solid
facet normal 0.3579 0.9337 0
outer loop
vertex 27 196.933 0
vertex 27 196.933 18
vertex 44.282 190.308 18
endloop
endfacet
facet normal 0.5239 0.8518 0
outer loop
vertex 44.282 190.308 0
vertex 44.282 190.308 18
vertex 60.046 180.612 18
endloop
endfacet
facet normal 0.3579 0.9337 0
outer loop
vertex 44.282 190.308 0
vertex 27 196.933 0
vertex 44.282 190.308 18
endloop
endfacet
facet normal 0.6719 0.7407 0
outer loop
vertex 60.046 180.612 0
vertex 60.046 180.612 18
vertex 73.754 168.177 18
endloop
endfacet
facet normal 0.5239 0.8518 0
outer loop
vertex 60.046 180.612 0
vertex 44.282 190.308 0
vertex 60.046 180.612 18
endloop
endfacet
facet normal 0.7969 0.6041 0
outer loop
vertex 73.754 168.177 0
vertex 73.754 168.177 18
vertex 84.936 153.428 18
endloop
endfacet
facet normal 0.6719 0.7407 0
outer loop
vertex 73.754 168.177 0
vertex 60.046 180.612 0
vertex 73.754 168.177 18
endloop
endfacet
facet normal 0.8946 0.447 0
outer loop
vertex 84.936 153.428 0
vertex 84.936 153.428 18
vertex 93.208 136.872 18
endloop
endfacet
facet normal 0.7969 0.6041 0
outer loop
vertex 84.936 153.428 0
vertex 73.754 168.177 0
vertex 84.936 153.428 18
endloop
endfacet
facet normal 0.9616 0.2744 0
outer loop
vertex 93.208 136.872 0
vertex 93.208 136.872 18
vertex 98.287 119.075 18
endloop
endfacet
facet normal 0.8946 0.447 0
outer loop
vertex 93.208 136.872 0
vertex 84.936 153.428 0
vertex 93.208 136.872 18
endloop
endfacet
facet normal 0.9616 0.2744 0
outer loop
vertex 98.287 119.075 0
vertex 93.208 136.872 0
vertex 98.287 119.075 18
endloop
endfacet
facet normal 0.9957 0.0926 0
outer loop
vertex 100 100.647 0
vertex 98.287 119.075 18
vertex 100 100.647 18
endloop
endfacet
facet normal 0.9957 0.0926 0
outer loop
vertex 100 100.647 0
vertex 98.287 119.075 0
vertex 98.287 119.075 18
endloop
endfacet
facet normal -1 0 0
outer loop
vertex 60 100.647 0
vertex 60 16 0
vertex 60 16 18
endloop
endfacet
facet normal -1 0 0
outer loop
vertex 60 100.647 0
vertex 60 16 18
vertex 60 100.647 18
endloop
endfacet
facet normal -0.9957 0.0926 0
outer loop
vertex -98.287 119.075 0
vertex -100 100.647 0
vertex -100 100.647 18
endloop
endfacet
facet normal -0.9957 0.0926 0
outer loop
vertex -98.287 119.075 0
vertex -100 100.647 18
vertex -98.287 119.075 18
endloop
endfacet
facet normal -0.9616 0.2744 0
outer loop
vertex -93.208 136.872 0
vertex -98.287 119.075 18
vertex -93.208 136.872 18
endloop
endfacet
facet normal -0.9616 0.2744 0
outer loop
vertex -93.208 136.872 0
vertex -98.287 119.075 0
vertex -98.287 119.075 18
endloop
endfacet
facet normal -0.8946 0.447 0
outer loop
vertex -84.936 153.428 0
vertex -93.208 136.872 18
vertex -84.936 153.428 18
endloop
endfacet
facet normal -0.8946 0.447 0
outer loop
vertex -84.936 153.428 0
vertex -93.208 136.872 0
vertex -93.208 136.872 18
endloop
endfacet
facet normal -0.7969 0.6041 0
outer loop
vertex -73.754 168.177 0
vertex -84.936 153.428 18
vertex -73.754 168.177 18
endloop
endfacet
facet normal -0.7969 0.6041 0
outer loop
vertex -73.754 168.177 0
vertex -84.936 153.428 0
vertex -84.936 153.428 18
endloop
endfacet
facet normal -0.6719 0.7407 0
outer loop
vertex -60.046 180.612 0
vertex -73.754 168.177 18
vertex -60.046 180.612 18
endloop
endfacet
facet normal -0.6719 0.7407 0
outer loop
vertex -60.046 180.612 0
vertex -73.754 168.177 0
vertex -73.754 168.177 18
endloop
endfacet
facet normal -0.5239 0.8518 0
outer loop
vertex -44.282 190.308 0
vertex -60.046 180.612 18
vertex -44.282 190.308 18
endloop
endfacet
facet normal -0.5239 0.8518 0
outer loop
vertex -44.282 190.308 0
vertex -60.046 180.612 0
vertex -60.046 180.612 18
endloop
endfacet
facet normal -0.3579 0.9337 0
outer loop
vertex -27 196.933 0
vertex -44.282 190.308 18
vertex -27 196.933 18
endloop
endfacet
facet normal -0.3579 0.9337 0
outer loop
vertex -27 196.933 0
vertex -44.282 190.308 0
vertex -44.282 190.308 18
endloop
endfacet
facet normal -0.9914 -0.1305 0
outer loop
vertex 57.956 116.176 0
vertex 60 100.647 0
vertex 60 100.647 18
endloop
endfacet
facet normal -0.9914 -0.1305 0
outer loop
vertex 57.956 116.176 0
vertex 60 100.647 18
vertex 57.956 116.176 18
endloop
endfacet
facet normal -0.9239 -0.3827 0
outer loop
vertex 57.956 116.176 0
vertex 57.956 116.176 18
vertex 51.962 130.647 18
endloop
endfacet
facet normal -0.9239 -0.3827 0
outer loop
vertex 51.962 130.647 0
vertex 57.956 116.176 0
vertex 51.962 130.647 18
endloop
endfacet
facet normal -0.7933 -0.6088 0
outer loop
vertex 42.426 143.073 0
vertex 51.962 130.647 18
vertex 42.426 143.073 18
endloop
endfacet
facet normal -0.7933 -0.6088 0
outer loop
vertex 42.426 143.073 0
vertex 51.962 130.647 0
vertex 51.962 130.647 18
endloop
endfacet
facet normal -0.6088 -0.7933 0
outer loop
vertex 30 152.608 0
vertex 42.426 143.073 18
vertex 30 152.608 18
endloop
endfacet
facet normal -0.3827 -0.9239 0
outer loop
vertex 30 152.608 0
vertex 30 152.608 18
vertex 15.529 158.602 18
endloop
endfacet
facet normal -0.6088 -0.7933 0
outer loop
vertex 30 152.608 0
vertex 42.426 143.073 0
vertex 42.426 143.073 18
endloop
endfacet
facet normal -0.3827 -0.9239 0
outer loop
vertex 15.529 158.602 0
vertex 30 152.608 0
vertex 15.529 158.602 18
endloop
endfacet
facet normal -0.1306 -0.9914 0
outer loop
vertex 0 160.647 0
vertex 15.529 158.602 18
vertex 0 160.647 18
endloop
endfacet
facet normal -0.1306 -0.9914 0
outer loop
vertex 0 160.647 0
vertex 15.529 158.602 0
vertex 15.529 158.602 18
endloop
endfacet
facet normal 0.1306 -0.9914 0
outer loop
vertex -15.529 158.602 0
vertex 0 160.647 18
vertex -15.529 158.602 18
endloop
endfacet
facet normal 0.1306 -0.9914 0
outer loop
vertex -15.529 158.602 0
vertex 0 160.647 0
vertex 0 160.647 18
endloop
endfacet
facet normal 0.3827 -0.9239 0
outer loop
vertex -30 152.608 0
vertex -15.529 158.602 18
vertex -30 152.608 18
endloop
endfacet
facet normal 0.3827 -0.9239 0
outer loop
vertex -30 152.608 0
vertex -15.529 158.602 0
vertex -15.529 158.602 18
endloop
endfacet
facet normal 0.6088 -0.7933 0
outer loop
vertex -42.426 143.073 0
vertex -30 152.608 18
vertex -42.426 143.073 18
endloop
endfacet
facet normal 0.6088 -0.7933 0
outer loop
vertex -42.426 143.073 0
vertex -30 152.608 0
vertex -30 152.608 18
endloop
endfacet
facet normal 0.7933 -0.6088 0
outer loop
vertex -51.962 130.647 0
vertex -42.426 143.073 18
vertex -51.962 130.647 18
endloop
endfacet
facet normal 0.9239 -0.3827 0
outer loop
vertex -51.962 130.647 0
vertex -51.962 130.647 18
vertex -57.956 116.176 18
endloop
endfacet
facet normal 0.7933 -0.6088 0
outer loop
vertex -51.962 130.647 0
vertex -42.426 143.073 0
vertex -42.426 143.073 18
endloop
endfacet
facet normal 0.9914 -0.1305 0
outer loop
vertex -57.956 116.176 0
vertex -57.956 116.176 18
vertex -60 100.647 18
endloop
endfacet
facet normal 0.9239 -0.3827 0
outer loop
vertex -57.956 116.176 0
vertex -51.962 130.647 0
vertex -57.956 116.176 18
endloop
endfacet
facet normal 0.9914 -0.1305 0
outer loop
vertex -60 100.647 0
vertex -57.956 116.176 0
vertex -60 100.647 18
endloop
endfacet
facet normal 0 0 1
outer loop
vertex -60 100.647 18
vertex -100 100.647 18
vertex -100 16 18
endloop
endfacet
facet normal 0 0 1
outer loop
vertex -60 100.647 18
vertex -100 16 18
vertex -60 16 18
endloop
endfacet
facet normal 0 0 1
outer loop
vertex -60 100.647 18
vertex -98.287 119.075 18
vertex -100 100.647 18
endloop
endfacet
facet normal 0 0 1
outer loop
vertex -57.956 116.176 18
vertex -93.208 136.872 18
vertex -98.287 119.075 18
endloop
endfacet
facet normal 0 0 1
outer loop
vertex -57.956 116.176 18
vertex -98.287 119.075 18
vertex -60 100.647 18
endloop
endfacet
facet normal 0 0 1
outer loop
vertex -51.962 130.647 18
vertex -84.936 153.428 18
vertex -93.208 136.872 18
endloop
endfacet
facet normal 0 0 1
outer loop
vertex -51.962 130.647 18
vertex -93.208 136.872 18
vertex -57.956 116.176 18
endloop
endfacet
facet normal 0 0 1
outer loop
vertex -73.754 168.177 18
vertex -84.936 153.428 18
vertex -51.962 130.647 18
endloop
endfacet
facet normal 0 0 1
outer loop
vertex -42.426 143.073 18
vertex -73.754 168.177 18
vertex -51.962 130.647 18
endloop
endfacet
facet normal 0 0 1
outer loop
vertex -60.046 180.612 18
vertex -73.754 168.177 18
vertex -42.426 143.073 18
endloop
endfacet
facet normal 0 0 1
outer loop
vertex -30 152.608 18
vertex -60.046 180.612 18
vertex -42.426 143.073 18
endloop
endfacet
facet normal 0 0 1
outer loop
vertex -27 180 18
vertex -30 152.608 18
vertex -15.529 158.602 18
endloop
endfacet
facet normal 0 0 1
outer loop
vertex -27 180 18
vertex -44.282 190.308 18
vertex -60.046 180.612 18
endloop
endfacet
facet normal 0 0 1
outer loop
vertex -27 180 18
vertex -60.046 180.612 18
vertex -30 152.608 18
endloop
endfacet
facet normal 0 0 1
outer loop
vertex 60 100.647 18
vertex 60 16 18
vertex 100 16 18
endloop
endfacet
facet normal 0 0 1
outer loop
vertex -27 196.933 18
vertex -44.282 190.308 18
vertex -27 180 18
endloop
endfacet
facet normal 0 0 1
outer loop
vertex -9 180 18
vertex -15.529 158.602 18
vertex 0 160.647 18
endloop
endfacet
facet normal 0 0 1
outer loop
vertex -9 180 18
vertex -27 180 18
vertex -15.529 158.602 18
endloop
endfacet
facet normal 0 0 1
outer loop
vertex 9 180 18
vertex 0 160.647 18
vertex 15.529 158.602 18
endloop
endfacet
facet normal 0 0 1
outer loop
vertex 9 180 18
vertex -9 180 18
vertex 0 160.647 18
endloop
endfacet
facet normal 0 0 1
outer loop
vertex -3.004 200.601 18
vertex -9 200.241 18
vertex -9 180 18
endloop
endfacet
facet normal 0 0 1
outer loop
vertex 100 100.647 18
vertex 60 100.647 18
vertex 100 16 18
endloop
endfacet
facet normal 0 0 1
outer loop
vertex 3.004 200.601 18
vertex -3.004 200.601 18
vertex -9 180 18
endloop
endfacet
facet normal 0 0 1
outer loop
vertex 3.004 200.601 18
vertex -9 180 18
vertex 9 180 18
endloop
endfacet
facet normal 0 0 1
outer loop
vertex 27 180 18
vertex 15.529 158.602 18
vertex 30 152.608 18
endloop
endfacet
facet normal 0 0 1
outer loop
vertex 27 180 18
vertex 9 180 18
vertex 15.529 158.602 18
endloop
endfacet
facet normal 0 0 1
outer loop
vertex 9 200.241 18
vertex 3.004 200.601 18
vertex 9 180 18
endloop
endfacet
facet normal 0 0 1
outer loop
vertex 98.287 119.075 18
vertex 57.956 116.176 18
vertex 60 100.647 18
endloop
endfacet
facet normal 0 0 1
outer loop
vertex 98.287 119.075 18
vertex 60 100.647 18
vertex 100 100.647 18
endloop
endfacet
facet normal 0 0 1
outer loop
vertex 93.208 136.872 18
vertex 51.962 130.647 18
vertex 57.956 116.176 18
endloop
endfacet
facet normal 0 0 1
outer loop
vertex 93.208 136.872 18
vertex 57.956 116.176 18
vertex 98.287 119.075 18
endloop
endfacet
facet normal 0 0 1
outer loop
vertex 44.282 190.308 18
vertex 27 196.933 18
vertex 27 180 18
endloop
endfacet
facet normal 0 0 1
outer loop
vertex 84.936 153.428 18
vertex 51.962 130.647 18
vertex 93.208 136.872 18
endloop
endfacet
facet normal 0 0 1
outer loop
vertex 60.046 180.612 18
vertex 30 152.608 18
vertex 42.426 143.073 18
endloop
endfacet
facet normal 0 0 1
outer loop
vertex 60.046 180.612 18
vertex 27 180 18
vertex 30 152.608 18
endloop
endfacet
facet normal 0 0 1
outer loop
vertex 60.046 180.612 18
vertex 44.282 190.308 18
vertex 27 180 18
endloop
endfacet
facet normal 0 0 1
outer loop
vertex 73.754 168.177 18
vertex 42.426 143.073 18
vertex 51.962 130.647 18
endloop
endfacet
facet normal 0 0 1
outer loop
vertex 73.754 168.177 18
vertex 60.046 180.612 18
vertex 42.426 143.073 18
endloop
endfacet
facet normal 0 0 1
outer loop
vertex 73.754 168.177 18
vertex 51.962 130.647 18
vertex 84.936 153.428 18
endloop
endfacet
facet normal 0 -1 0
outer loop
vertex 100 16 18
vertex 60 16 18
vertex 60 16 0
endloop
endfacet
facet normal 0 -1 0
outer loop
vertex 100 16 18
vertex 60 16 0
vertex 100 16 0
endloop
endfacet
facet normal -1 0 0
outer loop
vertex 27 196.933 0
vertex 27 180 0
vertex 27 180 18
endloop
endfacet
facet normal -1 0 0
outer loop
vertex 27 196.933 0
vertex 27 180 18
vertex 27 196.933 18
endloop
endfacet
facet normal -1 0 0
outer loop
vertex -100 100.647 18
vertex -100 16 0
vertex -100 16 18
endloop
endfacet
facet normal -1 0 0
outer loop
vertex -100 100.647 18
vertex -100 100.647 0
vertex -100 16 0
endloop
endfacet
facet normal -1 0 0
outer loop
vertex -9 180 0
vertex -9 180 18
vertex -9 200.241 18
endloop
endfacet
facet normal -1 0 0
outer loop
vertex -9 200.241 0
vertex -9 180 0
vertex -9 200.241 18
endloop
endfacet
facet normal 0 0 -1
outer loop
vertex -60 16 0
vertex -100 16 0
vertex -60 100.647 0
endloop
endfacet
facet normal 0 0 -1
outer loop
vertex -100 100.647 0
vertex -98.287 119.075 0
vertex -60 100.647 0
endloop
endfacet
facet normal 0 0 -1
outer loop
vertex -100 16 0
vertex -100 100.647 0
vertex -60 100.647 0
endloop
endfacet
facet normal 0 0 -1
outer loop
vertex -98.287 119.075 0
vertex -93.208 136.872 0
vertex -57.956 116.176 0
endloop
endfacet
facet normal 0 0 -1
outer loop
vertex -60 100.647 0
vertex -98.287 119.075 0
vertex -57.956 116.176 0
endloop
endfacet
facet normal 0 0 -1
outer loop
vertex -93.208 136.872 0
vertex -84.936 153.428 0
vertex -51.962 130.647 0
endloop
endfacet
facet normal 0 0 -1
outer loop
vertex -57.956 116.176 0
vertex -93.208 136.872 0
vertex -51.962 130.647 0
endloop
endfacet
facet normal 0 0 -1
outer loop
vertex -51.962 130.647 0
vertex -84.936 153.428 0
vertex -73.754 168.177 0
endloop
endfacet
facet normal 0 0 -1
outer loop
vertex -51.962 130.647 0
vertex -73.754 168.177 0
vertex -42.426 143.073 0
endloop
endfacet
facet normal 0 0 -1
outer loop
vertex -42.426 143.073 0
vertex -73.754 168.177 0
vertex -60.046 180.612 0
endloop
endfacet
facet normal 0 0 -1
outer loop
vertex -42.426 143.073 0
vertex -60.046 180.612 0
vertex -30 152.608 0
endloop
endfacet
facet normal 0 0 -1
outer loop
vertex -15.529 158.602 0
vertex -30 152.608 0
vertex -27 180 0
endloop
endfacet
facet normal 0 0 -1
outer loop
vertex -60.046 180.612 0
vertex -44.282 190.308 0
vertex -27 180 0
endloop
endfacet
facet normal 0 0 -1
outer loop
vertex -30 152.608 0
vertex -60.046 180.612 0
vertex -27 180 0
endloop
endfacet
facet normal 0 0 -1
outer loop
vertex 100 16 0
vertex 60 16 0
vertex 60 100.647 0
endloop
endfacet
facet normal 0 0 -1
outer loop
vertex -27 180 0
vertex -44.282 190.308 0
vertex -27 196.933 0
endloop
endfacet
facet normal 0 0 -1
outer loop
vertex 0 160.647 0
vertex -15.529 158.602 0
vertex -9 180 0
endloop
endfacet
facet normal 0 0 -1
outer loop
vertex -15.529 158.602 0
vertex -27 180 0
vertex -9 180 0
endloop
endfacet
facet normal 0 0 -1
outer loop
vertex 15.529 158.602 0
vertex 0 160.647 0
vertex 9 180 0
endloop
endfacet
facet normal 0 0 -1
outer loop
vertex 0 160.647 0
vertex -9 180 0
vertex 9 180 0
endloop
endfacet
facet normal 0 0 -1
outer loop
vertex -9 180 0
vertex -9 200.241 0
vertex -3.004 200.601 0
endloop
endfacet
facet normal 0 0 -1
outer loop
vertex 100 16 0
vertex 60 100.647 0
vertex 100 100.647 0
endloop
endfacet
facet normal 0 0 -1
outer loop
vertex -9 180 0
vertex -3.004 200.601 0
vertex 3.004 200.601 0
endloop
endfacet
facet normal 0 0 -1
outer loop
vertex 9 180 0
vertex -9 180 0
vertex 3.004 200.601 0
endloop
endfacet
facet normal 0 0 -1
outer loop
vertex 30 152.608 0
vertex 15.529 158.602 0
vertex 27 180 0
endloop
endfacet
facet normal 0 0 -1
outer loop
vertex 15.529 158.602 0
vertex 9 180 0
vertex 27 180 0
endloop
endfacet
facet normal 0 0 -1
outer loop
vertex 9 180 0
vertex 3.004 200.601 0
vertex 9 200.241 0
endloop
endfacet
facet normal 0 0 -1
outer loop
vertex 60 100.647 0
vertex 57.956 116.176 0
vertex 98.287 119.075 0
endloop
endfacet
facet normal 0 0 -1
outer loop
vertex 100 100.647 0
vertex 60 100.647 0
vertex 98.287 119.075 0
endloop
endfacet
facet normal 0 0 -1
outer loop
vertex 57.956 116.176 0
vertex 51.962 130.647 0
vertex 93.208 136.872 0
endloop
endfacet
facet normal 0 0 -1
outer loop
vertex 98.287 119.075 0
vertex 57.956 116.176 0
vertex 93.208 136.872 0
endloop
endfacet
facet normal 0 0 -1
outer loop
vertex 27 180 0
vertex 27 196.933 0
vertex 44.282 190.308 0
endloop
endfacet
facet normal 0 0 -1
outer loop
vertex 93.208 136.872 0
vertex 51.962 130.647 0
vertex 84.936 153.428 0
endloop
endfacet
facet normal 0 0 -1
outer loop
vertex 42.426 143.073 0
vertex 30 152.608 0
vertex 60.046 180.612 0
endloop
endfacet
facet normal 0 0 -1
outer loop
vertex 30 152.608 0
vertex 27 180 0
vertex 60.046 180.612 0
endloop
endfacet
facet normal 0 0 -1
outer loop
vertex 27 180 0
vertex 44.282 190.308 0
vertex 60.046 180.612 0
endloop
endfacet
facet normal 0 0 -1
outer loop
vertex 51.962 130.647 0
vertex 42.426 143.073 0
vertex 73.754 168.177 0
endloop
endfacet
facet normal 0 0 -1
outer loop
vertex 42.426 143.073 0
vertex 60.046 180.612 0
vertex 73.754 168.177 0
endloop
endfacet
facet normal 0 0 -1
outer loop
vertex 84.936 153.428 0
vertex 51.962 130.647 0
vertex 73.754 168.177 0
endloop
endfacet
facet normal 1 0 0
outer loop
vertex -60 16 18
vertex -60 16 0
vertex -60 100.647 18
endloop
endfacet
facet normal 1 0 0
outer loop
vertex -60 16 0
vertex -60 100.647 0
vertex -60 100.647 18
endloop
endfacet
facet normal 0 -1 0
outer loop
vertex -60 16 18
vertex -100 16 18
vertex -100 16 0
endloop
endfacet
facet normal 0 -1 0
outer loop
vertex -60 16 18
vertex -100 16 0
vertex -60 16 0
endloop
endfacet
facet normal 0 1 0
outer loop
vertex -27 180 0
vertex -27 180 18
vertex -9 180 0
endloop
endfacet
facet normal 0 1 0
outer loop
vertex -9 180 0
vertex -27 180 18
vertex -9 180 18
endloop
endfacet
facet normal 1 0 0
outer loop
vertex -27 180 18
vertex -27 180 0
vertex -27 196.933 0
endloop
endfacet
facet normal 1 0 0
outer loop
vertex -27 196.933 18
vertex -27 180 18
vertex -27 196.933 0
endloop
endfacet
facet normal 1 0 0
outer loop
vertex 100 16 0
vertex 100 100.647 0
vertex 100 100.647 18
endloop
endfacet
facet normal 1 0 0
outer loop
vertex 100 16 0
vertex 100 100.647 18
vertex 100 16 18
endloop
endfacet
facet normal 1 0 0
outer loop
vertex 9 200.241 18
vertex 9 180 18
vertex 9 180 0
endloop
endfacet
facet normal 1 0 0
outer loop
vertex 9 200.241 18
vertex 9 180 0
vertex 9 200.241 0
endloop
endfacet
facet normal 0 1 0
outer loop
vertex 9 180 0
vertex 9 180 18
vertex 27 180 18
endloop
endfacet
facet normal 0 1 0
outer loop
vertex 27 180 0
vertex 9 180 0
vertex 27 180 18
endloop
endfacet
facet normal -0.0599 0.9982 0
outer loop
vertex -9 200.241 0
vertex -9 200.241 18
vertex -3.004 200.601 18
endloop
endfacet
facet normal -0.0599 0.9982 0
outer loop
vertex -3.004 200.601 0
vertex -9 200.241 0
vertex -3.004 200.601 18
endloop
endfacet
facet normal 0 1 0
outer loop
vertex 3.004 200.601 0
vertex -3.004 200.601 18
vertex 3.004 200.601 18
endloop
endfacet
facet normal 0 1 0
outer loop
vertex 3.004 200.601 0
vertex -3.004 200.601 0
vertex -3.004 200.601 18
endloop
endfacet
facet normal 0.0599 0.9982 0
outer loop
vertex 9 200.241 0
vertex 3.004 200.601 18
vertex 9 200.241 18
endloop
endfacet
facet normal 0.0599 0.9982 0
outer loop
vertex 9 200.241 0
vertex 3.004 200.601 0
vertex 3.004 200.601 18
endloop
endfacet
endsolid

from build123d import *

# Parameters (mm, degrees)
BOSS_EXTRUDE1_DEPTH = 18
SKETCH2_W           = 18
SKETCH2_H           = 46.670060525
CUT_EXTRUDE1_DEPTH  = 19
SKETCH3_W           = 40
SKETCH3_H           = 18
BOSS_EXTRUDE2_DEPTH = 44


with BuildPart() as part:
    # Sketch1 → Boss-Extrude1 (new body)
    with BuildSketch(Plane.XY):
        with BuildLine():
            Line((60, 60), (60, 100.646547639))
            ThreePointArc((60, 100.646547639), (0, 160.646547639), (-60, 100.646547639))
            Line((-60, 100.646547639), (-60, 60))
            Line((-60, 60), (-100, 60))
            Line((-100, 60), (-100, 100.646547639))
            ThreePointArc((-100, 100.646547639), (0, 200.646547639), (100, 100.646547639))
            Line((100, 100.646547639), (100, 60))
            Line((100, 60), (60, 60))
        make_face()
    extrude(amount=BOSS_EXTRUDE1_DEPTH)

    # Sketch2 → Cut-Extrude1 (cut, through all)
    with BuildSketch(Plane.XY.offset(18)):
        with Locations((18, 203.335030263)):
            Rectangle(SKETCH2_W, SKETCH2_H)
        with Locations((-18, 203.335030263)):
            Rectangle(SKETCH2_W, SKETCH2_H)
    extrude(amount=-CUT_EXTRUDE1_DEPTH, mode=Mode.SUBTRACT)

    # Sketch3 → Boss-Extrude2 (add)
    with BuildSketch(Plane.XZ.offset(-60)):
        with Locations((-80, 9)):
            Rectangle(SKETCH3_W, SKETCH3_H)
        with Locations((80, 9)):
            Rectangle(SKETCH3_W, SKETCH3_H)
    extrude(amount=BOSS_EXTRUDE2_DEPTH)


solid = part.part
